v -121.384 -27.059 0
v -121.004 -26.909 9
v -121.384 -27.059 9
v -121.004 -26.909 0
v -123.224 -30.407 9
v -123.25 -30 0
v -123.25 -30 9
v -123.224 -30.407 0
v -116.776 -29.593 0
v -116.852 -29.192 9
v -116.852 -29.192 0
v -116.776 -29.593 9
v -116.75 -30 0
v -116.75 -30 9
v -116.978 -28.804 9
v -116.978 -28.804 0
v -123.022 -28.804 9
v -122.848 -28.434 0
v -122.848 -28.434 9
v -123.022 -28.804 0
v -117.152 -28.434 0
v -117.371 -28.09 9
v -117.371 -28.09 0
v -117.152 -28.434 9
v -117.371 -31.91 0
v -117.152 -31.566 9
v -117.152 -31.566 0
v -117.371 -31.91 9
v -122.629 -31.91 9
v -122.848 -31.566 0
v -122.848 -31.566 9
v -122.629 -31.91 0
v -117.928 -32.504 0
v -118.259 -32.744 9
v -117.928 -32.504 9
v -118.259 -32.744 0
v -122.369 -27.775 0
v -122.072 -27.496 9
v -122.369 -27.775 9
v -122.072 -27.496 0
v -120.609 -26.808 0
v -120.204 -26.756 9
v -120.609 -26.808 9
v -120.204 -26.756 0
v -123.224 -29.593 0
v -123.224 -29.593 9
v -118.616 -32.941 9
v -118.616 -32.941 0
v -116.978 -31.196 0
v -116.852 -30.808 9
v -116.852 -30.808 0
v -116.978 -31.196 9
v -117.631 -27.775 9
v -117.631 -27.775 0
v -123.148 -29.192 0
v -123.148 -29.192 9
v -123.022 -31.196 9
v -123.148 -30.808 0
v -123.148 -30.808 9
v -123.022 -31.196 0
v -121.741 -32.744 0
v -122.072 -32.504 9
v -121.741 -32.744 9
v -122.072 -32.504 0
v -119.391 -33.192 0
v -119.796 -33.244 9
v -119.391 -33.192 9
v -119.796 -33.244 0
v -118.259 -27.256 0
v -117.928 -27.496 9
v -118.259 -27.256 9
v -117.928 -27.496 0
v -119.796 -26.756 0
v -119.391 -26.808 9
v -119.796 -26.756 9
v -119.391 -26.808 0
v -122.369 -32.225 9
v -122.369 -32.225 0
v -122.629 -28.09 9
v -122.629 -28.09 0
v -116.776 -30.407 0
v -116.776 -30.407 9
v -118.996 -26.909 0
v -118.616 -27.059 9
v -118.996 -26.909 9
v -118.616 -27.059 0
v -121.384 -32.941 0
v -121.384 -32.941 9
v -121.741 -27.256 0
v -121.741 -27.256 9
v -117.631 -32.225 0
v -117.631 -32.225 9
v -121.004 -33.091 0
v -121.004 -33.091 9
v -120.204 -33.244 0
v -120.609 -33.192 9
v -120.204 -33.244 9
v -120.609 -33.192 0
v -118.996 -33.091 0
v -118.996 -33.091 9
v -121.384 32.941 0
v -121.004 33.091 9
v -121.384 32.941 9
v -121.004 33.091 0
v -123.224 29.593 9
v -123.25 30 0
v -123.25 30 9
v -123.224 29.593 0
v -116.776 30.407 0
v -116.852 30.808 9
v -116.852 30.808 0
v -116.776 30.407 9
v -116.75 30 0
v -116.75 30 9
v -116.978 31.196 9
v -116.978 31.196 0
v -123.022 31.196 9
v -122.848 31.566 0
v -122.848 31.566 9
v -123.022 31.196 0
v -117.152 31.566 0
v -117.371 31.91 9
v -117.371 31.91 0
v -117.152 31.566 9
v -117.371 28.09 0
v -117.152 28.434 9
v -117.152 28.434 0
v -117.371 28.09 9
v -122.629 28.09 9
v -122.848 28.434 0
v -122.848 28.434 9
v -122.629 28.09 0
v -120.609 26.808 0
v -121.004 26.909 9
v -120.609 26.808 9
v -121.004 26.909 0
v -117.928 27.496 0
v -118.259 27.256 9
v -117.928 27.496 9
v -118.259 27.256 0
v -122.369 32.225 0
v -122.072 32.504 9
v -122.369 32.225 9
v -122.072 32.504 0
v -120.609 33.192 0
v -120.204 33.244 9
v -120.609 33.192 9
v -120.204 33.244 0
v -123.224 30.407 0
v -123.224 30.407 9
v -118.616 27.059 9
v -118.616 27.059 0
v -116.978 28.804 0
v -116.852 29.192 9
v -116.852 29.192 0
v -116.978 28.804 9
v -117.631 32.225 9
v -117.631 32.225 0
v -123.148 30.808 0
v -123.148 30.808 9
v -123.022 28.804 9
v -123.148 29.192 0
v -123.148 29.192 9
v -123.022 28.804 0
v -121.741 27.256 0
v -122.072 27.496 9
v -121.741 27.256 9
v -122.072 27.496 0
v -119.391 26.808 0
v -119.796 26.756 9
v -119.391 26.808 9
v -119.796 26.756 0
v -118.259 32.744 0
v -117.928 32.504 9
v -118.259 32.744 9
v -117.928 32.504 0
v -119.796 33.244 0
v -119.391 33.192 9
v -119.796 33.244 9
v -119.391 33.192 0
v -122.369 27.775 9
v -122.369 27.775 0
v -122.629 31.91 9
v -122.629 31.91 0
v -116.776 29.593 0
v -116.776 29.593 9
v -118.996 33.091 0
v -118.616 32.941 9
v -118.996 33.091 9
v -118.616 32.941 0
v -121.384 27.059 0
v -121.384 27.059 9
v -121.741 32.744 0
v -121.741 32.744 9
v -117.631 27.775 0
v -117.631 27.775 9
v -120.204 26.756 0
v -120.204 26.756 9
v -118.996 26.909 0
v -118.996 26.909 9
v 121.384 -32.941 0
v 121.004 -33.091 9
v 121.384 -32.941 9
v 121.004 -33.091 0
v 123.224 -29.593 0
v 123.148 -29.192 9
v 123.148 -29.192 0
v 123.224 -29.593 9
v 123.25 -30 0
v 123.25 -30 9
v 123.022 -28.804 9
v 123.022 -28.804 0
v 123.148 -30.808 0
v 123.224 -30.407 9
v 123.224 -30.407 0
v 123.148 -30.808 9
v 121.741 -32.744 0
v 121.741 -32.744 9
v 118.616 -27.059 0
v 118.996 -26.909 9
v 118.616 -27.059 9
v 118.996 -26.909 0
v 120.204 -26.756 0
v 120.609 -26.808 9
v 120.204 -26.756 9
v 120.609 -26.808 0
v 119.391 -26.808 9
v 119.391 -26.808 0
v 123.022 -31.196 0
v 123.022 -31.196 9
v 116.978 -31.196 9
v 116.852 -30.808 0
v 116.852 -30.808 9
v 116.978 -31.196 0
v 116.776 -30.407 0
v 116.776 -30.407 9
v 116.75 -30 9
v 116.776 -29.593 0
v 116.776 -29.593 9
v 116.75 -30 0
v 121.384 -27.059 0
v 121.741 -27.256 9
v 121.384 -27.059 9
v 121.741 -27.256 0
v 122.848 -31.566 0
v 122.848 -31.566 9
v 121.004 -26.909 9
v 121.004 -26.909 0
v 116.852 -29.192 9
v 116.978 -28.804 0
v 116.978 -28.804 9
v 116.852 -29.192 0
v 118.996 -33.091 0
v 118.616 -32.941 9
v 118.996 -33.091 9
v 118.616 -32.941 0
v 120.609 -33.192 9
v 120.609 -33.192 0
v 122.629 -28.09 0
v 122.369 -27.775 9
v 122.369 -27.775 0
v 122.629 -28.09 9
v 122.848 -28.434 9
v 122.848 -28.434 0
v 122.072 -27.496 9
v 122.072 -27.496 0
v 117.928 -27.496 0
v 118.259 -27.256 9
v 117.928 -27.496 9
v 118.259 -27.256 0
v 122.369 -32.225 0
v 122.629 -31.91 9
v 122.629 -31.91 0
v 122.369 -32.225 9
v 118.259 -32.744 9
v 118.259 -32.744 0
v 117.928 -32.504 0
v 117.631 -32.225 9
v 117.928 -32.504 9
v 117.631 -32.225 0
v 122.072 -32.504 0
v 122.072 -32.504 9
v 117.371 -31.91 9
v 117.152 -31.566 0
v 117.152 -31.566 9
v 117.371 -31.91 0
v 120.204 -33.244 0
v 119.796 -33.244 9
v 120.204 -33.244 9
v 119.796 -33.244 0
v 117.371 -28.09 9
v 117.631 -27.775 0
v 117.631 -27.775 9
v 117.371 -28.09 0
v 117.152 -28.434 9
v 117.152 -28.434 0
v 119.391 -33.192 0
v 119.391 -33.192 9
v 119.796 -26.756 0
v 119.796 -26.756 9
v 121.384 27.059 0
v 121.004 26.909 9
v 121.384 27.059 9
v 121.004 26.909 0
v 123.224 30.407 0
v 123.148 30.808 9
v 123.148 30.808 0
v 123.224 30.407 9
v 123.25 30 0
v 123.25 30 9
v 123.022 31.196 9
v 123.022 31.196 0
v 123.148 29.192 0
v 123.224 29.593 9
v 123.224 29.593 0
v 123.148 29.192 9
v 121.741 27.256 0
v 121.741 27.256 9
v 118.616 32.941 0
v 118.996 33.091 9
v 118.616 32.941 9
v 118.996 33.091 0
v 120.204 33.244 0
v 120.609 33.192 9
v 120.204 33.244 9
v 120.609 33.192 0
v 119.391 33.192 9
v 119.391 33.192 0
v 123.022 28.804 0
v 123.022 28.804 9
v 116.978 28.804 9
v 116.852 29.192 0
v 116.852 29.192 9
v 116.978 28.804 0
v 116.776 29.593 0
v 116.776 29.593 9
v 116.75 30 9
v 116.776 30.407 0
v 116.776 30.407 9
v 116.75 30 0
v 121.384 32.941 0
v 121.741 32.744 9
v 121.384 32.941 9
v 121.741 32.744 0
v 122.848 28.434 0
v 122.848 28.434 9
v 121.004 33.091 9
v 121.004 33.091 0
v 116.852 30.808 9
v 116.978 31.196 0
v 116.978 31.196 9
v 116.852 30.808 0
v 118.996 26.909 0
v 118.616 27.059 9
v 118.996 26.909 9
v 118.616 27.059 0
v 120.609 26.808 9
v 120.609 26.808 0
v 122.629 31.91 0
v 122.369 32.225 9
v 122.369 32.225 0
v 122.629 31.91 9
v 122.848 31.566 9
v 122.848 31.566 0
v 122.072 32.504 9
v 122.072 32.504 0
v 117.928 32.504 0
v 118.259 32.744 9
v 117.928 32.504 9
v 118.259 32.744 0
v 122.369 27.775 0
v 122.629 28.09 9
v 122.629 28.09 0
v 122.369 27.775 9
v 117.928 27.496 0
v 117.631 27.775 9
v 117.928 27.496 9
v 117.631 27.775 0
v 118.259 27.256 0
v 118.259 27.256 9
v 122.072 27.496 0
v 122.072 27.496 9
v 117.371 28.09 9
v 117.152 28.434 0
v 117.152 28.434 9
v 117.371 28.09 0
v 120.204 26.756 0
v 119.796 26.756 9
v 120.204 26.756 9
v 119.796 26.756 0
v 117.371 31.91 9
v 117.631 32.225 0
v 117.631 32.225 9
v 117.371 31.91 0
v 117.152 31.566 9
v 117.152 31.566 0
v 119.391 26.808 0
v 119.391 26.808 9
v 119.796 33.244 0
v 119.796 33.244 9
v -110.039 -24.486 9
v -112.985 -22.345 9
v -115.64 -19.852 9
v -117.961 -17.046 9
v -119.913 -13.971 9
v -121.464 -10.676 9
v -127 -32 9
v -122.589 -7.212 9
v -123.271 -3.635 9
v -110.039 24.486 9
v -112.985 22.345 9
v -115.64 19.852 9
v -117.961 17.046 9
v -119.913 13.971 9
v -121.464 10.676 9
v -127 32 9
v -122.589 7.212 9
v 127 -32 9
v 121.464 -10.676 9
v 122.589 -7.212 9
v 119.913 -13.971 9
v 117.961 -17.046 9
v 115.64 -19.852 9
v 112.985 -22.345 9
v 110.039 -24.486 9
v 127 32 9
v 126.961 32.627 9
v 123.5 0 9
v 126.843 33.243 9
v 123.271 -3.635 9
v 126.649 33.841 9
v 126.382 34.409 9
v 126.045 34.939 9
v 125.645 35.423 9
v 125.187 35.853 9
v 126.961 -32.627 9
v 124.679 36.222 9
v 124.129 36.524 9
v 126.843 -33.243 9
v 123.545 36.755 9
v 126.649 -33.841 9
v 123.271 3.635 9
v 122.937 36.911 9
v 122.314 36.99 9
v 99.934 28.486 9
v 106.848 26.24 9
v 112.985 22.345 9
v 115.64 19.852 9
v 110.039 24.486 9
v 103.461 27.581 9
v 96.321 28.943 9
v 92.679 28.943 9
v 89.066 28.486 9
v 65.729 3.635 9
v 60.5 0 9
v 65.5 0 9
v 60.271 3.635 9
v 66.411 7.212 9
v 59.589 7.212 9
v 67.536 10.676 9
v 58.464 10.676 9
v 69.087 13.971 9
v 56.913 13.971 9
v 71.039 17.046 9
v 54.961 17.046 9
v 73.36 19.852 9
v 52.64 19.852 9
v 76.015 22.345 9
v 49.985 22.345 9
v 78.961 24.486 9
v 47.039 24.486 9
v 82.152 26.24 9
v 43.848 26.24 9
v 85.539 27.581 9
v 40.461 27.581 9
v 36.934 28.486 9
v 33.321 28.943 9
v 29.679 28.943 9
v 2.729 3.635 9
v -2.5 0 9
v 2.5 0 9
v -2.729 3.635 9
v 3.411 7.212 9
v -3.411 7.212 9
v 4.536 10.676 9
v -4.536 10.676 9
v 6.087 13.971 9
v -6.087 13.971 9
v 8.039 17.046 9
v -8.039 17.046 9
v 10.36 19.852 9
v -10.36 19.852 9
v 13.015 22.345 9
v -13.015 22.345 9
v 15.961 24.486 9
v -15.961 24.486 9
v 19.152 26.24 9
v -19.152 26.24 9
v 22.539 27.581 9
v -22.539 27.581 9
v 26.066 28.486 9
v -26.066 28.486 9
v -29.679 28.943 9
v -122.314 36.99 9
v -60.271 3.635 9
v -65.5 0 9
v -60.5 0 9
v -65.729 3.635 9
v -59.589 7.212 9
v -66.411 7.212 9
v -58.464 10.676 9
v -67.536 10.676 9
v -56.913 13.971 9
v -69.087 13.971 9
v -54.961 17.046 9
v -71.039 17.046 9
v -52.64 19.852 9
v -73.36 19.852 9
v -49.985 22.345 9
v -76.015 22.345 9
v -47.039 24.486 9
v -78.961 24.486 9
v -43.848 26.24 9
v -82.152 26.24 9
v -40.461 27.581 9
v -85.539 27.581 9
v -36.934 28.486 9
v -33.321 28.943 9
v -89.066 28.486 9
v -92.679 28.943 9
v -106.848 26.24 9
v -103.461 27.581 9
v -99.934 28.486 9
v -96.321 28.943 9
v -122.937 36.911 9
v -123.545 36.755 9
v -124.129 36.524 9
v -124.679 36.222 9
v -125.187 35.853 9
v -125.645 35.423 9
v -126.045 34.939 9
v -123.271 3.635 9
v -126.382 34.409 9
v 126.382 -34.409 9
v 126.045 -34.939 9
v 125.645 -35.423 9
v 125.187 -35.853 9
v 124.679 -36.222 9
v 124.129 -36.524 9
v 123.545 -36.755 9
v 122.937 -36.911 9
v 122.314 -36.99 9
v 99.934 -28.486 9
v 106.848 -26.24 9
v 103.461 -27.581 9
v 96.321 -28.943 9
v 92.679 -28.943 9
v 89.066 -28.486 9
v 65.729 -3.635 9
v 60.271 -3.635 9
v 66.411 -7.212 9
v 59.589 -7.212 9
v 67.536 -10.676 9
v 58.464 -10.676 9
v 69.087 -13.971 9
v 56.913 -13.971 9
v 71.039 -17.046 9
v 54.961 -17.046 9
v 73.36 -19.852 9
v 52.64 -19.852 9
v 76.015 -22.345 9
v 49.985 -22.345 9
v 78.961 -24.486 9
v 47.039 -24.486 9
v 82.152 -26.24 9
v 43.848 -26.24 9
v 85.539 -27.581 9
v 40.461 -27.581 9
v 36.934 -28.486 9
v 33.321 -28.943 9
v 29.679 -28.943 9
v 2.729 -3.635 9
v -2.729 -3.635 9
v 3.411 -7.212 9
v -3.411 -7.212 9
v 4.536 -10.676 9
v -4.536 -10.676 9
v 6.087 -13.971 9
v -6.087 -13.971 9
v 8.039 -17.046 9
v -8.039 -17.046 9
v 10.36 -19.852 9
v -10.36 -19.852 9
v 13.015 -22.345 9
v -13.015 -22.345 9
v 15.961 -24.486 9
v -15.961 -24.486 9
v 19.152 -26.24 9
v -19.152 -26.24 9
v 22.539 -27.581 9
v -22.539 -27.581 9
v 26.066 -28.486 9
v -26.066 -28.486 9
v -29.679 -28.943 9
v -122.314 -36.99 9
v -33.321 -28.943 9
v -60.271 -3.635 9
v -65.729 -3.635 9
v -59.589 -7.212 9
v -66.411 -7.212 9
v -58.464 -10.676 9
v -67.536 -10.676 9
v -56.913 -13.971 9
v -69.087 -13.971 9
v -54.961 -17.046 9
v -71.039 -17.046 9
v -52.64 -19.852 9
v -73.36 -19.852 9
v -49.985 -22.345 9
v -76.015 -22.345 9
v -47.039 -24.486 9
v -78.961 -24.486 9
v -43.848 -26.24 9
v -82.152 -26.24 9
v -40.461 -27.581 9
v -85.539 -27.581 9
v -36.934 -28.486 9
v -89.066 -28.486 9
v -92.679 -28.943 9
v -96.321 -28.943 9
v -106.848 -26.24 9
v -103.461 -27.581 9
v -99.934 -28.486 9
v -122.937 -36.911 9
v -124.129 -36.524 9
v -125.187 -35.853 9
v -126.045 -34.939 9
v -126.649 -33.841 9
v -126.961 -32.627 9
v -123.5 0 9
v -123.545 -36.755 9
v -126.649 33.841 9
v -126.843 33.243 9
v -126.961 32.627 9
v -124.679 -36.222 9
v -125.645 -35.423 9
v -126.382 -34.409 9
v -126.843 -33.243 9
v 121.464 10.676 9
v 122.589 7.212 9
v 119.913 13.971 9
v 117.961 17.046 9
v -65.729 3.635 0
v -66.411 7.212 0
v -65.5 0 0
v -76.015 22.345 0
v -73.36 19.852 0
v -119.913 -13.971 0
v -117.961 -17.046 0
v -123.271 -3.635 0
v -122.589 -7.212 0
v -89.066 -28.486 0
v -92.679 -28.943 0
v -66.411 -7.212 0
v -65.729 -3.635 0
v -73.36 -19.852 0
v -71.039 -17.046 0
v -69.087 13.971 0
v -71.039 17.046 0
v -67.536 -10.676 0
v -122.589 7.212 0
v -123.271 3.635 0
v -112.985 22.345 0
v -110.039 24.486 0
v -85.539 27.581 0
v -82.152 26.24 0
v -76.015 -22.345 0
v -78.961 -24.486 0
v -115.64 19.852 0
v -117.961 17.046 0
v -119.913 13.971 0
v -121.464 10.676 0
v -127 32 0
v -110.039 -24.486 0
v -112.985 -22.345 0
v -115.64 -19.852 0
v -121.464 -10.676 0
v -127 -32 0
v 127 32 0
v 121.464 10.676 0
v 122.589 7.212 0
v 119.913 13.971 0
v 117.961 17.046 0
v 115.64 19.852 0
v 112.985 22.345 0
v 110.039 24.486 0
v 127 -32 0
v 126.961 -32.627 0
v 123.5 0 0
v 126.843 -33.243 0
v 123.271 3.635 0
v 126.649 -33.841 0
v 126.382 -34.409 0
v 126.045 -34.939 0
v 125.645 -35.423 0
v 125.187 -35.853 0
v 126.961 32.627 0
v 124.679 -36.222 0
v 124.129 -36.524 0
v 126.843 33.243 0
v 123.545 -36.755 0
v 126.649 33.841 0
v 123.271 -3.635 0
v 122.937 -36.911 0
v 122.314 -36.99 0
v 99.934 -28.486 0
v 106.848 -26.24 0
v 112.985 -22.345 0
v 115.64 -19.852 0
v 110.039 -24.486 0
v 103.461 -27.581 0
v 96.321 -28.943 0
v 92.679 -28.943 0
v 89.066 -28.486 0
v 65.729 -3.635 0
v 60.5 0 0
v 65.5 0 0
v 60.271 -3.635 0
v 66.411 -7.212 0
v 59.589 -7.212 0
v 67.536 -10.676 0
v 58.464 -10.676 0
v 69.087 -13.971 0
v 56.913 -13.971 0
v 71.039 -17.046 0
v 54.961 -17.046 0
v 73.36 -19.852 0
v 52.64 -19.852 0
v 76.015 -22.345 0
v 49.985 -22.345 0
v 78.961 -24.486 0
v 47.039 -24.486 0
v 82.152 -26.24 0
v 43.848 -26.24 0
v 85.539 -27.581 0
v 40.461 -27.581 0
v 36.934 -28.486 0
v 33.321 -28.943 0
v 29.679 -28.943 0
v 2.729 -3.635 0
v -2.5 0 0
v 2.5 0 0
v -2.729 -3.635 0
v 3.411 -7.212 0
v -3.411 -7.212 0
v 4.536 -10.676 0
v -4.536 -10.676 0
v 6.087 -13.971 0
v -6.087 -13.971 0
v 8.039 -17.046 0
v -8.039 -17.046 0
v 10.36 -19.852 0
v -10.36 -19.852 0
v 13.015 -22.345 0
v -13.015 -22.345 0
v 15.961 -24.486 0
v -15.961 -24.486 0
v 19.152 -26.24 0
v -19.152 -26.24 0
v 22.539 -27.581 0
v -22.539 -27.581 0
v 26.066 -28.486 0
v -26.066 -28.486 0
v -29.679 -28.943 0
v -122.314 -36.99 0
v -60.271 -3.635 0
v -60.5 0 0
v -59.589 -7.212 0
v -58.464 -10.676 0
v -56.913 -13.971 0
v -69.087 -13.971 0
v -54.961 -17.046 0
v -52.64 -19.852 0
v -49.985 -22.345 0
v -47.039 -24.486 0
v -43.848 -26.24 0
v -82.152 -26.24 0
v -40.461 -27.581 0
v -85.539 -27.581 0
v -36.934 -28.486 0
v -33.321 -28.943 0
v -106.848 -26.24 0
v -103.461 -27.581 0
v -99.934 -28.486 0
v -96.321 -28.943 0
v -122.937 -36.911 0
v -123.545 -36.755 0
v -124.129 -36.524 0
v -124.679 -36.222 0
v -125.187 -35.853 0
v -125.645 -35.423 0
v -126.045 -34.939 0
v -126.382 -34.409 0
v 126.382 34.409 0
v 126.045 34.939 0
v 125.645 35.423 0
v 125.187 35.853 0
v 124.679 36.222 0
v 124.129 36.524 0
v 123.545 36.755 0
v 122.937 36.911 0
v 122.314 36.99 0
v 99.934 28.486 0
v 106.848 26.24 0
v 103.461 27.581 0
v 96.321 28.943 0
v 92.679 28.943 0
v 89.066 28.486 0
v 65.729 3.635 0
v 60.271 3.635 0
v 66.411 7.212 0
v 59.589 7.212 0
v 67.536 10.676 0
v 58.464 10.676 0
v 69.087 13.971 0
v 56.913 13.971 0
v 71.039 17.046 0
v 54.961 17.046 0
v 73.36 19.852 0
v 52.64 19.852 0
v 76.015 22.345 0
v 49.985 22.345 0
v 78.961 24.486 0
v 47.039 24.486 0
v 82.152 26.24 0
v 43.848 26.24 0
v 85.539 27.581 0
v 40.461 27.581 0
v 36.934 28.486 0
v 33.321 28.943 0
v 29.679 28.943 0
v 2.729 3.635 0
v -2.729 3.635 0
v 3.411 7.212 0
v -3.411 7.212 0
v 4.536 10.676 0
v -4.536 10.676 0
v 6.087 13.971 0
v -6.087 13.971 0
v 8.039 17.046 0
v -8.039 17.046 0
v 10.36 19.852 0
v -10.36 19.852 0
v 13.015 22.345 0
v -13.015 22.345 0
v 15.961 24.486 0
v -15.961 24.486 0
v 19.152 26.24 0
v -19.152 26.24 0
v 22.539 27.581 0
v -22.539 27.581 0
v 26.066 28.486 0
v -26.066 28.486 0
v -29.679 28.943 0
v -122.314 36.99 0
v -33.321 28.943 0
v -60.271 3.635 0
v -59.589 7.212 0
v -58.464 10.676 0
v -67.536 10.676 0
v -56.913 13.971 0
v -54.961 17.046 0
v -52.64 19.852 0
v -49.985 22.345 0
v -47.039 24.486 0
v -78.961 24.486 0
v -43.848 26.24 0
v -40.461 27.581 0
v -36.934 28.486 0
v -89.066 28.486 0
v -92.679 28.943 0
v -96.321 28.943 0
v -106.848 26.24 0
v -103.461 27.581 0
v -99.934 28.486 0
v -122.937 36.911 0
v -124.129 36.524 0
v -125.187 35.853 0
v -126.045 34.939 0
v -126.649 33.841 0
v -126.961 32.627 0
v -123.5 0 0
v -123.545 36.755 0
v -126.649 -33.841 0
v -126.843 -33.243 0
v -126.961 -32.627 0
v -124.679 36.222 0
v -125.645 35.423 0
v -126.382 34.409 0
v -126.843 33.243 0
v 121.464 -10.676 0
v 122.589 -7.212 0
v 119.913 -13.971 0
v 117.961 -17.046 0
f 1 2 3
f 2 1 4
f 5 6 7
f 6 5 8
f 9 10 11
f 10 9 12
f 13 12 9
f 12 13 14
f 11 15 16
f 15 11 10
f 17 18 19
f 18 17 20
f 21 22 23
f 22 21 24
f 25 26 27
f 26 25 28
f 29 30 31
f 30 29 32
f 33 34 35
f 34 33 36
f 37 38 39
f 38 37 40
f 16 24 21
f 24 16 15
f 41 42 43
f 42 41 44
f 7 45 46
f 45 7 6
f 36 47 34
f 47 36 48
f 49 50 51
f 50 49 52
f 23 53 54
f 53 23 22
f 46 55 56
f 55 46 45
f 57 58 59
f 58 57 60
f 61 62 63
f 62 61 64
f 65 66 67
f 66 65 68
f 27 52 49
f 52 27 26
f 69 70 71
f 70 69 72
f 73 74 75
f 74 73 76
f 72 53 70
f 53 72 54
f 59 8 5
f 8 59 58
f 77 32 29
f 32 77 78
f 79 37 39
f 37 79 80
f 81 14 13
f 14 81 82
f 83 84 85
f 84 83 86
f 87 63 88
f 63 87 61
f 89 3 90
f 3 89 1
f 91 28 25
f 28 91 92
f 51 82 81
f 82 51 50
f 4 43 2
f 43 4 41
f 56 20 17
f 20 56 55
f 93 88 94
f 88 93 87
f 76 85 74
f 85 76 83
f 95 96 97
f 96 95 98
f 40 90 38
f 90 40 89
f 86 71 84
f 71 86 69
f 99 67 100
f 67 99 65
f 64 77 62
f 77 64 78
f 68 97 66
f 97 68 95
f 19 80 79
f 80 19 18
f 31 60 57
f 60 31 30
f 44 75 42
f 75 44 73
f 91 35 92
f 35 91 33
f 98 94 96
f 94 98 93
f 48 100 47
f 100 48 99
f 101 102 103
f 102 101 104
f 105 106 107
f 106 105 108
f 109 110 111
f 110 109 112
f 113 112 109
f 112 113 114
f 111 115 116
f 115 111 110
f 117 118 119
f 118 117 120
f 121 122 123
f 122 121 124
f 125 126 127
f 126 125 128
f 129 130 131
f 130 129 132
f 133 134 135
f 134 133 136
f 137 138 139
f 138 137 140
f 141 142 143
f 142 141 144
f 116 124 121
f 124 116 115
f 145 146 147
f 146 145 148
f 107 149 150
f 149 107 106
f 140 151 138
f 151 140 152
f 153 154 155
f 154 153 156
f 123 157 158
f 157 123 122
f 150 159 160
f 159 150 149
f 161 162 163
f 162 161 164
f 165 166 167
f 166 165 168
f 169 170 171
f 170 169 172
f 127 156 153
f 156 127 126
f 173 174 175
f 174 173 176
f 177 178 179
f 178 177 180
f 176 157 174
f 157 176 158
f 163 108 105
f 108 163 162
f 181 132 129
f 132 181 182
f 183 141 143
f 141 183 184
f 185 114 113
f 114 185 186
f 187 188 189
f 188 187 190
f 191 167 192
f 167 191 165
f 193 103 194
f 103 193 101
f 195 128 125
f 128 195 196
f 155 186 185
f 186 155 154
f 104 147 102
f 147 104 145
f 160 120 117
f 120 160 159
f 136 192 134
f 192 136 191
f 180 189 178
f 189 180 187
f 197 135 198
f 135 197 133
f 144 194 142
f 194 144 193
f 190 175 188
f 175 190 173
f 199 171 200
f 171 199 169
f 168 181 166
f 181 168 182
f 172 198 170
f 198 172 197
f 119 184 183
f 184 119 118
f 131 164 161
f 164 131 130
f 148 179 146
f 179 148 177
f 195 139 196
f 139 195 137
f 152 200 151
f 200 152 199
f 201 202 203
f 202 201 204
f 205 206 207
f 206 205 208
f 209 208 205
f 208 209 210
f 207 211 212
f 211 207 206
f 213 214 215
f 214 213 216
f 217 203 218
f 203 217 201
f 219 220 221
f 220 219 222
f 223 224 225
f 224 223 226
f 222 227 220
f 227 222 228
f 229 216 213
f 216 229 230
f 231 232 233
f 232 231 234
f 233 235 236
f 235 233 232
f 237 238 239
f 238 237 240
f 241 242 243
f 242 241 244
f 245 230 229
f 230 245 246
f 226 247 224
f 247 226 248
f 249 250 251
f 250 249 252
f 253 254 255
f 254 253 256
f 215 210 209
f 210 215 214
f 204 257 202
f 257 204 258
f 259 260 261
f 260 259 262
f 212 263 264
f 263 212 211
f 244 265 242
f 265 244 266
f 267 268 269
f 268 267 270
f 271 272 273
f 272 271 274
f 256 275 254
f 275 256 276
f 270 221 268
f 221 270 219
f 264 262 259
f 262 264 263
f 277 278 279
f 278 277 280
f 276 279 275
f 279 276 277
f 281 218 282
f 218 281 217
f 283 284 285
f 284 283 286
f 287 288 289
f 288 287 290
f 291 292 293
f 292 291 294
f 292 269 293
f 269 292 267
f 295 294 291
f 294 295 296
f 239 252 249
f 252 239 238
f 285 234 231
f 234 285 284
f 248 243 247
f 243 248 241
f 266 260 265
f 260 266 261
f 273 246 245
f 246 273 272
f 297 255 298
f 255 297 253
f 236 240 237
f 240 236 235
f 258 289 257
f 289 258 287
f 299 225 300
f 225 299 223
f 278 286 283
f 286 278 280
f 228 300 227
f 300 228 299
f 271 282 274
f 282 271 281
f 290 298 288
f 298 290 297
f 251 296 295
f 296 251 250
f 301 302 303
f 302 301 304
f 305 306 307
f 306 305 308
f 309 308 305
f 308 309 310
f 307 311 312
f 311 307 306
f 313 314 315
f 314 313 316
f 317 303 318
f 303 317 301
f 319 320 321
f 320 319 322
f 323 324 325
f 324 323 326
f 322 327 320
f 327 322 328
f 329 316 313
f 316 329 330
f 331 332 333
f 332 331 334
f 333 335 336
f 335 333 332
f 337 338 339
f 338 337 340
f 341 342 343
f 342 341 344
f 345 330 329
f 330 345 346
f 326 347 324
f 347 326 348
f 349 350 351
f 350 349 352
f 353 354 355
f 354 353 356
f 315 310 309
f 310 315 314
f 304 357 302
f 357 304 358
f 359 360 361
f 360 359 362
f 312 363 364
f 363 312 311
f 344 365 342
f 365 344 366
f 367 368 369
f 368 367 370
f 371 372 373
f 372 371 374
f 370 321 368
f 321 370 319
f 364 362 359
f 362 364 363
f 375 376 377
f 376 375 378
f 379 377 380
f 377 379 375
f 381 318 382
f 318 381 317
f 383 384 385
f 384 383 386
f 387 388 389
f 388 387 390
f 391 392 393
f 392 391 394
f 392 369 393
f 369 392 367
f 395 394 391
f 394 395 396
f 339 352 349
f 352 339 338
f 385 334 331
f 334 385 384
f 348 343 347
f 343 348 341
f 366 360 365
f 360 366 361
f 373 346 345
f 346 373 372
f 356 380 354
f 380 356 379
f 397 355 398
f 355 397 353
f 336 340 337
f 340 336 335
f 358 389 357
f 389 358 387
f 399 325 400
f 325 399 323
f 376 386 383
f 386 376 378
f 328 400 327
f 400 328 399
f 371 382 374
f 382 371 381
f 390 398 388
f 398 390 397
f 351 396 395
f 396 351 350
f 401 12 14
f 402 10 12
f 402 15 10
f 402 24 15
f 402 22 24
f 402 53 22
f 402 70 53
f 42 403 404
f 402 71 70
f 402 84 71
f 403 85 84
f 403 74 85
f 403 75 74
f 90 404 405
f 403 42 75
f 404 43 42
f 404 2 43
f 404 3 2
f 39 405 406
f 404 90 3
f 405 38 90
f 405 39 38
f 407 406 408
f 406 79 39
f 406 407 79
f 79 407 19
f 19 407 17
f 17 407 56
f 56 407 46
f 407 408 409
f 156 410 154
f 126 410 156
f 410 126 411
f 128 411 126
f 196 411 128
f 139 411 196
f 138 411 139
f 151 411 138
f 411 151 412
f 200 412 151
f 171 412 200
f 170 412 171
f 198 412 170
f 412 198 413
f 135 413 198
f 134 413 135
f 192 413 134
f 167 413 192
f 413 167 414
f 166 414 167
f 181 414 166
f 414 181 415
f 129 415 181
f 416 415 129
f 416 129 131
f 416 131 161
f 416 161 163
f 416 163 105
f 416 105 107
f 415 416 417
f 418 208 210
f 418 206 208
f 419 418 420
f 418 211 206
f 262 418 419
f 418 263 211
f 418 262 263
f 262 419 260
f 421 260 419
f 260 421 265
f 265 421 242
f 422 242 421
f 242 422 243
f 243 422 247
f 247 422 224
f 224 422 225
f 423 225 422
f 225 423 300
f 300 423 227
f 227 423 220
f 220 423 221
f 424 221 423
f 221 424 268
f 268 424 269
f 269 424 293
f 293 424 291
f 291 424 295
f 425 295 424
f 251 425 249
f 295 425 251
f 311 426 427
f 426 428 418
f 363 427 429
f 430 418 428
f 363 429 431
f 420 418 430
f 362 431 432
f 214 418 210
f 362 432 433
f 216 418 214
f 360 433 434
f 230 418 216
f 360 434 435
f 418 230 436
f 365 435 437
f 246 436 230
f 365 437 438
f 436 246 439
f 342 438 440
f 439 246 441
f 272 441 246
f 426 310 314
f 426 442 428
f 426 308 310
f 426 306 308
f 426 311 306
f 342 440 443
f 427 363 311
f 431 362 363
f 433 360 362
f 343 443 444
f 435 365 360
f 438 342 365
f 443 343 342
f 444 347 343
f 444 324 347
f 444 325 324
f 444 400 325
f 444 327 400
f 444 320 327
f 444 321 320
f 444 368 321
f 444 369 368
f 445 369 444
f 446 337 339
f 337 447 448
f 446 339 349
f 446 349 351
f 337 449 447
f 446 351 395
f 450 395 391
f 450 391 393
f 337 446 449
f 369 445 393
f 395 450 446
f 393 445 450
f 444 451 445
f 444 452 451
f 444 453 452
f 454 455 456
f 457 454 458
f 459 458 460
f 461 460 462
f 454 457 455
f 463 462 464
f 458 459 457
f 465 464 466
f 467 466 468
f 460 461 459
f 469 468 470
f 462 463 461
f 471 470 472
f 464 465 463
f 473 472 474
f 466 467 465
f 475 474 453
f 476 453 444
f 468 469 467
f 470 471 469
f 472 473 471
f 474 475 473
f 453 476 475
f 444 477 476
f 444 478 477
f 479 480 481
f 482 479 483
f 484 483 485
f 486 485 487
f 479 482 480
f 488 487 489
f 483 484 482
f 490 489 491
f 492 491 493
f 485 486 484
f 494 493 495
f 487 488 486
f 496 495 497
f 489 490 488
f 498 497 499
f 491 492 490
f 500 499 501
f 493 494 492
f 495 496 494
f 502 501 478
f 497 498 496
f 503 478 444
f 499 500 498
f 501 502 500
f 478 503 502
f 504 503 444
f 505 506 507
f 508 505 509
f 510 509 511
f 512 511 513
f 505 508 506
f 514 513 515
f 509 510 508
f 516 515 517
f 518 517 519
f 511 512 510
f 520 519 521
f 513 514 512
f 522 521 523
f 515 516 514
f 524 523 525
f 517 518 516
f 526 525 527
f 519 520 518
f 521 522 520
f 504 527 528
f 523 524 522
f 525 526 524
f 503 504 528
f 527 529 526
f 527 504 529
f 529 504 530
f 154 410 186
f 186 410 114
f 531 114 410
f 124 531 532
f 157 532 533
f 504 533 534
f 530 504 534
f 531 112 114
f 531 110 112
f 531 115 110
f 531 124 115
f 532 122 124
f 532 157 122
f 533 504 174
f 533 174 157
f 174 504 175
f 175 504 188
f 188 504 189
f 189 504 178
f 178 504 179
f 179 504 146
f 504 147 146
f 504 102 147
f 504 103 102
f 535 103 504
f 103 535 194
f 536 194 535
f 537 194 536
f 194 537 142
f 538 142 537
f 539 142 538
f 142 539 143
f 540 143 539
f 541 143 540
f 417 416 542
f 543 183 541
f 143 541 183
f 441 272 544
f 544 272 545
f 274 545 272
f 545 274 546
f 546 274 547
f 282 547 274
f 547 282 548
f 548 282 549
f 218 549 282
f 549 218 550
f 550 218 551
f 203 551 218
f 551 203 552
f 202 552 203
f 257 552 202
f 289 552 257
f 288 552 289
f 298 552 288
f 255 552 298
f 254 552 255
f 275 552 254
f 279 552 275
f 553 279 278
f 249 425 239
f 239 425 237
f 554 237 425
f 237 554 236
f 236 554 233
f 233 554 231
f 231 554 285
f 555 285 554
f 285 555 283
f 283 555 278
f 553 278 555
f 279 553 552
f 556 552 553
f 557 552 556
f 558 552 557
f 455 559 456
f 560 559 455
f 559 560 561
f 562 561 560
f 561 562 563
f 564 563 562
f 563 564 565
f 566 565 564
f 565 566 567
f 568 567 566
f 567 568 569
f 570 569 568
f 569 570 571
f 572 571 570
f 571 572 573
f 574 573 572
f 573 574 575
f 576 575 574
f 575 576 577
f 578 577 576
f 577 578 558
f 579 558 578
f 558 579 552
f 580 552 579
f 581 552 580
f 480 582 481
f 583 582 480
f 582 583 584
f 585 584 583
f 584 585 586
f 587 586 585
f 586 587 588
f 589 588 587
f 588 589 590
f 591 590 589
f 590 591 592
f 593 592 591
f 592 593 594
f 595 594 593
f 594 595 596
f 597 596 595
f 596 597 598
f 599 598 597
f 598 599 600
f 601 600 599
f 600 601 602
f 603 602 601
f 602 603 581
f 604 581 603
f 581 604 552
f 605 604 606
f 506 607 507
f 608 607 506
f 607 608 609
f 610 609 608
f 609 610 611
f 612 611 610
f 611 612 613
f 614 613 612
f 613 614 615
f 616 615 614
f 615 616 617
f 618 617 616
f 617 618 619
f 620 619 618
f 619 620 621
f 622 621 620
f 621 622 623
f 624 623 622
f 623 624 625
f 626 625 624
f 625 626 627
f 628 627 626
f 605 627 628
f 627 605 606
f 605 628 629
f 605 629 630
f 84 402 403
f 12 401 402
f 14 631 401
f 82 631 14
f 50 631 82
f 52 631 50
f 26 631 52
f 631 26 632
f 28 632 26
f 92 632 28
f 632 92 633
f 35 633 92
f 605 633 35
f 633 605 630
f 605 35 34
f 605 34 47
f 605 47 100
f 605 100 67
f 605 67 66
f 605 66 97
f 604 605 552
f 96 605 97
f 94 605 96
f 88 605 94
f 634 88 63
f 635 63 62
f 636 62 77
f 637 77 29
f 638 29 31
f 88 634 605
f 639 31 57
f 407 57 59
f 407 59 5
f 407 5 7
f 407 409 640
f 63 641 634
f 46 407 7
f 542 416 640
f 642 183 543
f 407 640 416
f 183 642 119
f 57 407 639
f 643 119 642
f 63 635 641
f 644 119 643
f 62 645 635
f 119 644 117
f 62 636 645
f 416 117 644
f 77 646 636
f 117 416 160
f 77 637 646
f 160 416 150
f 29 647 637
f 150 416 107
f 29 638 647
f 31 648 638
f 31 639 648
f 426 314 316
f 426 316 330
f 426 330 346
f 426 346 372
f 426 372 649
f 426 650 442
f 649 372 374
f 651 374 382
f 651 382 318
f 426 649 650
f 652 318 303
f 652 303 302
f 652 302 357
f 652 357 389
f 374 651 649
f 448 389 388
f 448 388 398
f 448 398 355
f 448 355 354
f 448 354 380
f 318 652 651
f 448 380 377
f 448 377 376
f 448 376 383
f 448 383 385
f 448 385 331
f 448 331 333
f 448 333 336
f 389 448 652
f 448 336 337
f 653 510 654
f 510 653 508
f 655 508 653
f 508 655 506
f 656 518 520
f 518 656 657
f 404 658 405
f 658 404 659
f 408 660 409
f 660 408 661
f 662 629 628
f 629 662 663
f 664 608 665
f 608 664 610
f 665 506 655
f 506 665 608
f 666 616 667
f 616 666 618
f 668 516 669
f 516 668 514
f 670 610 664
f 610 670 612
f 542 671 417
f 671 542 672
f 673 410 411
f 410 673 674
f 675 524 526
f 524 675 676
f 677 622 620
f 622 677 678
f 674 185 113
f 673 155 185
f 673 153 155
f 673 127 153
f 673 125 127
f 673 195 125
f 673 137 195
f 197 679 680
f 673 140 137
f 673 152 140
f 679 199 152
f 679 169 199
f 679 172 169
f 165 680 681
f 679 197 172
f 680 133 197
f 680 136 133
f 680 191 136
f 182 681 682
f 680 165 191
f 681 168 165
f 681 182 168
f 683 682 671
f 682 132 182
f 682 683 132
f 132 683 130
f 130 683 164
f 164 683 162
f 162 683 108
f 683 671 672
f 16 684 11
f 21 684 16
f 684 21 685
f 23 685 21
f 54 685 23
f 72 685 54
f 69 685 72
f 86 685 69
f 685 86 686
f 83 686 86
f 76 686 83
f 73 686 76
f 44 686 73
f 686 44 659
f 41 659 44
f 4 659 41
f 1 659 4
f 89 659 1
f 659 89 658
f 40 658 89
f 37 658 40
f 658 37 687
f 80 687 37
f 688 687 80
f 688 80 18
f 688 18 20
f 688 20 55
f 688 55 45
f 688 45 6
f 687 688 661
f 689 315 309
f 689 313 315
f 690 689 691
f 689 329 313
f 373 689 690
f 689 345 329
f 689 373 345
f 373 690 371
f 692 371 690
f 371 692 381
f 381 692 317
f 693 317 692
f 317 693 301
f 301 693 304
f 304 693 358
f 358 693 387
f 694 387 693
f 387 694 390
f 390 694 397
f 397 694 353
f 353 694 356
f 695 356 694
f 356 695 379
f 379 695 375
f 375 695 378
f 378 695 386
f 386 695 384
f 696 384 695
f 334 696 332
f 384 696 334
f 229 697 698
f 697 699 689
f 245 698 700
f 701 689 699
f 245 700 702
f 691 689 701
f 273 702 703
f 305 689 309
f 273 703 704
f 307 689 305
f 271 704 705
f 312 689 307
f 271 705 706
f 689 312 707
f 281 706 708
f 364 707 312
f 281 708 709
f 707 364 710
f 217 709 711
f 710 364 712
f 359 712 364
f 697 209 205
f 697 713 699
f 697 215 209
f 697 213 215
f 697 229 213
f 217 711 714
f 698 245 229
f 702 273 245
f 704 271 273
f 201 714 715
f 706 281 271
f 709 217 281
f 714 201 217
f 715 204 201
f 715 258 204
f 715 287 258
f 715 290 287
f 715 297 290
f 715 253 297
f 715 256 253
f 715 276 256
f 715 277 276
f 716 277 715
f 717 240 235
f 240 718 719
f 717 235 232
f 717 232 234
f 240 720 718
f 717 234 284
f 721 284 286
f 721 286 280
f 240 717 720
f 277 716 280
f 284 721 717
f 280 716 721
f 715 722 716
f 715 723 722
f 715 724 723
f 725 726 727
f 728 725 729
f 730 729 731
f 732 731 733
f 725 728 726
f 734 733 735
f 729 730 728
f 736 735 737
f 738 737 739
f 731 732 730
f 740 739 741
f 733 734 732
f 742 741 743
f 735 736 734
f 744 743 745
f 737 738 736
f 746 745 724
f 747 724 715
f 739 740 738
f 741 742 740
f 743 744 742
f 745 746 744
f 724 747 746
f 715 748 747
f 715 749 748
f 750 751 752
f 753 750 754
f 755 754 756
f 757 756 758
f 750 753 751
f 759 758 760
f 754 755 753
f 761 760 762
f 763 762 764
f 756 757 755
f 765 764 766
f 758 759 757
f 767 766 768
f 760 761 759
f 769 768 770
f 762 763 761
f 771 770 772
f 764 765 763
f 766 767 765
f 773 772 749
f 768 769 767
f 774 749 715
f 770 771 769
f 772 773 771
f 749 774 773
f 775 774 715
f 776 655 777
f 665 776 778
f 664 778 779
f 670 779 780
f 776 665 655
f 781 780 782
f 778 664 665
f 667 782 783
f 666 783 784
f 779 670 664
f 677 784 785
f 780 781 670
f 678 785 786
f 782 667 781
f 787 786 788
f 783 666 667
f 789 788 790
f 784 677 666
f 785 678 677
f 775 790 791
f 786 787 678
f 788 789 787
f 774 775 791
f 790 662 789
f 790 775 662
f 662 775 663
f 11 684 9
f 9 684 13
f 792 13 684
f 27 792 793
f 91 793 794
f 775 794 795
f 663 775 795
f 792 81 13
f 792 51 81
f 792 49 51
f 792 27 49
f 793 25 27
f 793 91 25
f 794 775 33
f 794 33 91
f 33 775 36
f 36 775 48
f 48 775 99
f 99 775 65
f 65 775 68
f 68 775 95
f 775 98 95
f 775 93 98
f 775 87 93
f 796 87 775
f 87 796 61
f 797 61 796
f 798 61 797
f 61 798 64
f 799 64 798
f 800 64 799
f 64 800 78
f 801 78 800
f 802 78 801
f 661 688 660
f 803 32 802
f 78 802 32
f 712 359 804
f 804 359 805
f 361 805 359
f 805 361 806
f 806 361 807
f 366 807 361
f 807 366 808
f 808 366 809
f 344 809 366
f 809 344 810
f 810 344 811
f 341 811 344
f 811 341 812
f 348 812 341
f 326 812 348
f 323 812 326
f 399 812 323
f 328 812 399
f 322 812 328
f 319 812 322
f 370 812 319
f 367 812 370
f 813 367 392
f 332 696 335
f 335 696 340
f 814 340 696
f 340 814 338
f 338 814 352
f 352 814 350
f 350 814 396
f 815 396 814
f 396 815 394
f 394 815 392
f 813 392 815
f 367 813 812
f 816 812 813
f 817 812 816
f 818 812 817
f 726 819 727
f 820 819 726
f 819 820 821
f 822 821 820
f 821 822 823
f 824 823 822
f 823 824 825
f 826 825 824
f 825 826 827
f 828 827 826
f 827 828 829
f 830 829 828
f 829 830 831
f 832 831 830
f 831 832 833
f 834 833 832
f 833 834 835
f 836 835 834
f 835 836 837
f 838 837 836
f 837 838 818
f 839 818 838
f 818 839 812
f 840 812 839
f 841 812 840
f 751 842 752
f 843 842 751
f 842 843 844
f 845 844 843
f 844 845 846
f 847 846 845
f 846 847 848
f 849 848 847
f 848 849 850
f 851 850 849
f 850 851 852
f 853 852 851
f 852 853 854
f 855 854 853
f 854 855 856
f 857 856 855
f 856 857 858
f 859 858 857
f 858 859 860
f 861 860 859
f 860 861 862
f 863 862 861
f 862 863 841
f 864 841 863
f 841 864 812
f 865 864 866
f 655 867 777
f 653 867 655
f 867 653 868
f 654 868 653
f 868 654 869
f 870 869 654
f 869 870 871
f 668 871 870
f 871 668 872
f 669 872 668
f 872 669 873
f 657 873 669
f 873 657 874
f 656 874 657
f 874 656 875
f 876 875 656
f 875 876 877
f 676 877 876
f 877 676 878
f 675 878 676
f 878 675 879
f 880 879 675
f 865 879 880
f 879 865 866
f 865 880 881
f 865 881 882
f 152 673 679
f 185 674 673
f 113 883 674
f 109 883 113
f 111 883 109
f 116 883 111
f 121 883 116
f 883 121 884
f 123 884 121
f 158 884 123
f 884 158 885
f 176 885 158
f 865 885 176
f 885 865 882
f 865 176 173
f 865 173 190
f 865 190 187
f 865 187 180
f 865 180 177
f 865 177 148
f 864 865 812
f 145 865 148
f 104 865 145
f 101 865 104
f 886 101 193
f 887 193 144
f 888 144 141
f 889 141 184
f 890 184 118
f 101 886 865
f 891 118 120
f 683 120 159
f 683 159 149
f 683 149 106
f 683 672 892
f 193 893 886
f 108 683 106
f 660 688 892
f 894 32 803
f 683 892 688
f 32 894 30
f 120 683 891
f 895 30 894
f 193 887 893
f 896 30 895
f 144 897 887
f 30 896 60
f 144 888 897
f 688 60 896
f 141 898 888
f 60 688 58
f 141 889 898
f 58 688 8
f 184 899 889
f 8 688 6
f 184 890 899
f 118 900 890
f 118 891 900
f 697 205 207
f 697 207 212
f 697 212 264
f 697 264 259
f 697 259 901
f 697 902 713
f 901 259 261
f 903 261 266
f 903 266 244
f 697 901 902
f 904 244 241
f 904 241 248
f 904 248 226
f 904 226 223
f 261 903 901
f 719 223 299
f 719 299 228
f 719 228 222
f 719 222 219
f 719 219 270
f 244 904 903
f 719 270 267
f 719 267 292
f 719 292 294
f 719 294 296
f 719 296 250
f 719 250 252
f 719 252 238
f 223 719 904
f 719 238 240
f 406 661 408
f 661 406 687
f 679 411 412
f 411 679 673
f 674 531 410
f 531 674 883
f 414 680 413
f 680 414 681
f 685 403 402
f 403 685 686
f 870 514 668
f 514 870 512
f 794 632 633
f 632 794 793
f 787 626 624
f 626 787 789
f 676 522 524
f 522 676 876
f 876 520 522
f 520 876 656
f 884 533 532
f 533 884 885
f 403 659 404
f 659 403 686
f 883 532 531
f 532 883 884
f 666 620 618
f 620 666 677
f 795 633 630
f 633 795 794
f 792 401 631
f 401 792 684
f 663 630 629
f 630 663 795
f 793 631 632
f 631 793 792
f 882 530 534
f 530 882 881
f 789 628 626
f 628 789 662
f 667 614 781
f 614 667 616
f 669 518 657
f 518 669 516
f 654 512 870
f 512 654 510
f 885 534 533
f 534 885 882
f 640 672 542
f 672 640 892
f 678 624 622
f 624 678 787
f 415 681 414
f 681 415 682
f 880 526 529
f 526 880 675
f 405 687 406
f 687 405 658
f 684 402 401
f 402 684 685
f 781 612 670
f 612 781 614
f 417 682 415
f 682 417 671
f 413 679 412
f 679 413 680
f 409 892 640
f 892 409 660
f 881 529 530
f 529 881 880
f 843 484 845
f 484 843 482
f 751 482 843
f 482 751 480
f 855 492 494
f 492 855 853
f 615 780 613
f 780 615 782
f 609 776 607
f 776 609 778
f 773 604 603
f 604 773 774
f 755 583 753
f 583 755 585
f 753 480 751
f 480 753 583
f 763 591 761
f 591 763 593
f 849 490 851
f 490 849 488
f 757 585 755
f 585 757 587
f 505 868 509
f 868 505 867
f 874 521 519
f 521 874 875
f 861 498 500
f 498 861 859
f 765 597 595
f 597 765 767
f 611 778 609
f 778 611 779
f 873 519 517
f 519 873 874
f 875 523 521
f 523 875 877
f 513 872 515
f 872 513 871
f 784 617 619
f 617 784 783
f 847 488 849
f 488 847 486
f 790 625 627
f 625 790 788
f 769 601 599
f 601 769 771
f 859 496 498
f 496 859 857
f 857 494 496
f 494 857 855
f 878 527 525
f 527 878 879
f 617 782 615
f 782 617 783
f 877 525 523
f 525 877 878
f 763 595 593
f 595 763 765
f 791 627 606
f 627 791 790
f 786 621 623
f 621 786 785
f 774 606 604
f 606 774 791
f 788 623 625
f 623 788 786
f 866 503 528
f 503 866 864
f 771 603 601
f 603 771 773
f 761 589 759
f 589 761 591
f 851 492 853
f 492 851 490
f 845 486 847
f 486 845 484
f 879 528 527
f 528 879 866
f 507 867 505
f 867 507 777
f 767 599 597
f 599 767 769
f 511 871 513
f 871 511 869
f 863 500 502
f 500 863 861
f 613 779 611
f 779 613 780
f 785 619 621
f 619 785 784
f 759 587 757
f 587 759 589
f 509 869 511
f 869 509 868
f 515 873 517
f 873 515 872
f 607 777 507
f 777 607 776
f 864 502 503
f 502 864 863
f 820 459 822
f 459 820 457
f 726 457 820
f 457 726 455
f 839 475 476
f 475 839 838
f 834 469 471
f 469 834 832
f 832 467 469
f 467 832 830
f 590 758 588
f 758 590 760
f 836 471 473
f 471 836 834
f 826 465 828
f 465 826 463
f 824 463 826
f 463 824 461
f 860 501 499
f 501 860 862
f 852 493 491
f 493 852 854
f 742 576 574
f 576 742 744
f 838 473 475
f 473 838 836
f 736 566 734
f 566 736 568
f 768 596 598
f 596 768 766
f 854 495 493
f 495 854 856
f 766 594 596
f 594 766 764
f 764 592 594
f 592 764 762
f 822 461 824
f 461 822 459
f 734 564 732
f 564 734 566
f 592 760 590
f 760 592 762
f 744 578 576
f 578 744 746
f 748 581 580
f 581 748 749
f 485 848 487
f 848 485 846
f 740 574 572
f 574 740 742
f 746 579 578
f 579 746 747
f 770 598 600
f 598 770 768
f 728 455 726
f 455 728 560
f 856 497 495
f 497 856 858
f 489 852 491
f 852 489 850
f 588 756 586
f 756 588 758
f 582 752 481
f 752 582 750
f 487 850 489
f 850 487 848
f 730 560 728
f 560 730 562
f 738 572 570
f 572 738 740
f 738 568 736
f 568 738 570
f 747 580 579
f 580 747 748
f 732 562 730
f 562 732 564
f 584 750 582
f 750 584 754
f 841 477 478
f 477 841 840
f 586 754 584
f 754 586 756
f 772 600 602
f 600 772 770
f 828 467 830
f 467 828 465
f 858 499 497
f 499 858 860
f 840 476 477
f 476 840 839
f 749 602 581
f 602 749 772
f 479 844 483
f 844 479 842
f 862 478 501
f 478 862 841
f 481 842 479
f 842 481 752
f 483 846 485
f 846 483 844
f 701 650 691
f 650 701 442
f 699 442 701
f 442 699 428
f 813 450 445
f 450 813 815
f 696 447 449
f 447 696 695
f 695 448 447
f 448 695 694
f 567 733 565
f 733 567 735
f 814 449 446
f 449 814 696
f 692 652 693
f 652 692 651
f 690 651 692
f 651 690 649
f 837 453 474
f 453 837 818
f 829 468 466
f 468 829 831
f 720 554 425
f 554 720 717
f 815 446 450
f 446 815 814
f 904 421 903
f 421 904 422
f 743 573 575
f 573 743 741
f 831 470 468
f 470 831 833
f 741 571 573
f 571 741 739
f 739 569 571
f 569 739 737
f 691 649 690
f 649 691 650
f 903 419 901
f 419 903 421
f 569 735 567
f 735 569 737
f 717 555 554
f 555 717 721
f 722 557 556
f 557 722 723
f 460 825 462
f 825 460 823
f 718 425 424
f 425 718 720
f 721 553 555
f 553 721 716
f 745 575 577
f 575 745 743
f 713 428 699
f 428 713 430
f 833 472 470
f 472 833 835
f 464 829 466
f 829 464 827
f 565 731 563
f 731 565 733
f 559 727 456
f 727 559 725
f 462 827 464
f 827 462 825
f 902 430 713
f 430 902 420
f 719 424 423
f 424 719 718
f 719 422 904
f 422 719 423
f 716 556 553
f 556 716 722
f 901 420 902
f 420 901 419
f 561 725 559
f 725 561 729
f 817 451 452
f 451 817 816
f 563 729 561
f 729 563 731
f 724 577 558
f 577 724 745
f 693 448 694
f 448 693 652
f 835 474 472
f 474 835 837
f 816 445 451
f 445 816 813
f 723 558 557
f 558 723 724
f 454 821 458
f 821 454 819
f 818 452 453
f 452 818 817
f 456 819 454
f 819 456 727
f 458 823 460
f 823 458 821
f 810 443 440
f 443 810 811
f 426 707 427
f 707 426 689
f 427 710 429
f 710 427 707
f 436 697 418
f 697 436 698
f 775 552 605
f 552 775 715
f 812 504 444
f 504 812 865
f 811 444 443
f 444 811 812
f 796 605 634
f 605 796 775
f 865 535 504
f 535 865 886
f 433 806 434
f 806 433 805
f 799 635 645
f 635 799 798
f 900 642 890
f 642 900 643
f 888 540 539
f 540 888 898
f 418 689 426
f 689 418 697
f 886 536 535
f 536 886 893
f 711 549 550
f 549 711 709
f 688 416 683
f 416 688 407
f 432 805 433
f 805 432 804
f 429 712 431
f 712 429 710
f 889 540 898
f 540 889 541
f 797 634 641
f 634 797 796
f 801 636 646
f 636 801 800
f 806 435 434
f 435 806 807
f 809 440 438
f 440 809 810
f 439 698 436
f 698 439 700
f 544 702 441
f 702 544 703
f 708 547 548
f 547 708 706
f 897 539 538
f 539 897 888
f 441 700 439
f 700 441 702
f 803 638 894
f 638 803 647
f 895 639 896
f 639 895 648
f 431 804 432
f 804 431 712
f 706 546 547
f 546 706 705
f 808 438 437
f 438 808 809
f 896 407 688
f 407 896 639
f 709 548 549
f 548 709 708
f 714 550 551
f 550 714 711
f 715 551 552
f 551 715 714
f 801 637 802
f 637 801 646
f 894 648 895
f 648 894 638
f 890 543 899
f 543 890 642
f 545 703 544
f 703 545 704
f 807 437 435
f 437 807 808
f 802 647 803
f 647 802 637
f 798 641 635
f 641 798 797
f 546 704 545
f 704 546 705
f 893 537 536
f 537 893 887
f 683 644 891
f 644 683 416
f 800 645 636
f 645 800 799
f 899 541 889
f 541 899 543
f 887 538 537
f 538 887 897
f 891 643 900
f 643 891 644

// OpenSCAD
$fn = 50;


difference() {
	union() {
		hull() {
			translate(v = [-122.0000000000, 32.0000000000, 0]) {
				cylinder(h = 9, r = 5);
			}
			translate(v = [122.0000000000, 32.0000000000, 0]) {
				cylinder(h = 9, r = 5);
			}
			translate(v = [-122.0000000000, -32.0000000000, 0]) {
				cylinder(h = 9, r = 5);
			}
			translate(v = [122.0000000000, -32.0000000000, 0]) {
				cylinder(h = 9, r = 5);
			}
		}
	}
	union() {
		#translate(v = [-120.0000000000, -30.0000000000, -100.0000000000]) {
			cylinder(h = 200, r = 3.2500000000);
		}
		#translate(v = [-120.0000000000, 30.0000000000, -100.0000000000]) {
			cylinder(h = 200, r = 3.2500000000);
		}
		#translate(v = [120.0000000000, -30.0000000000, -100.0000000000]) {
			cylinder(h = 200, r = 3.2500000000);
		}
		#translate(v = [120.0000000000, 30.0000000000, -100.0000000000]) {
			cylinder(h = 200, r = 3.2500000000);
		}
		#translate(v = [-94.5000000000, 0, 0]) {
			cylinder(h = 9, r = 29.0000000000);
		}
		#translate(v = [-31.5000000000, 0, 0]) {
			cylinder(h = 9, r = 29.0000000000);
		}
		#translate(v = [31.5000000000, 0, 0]) {
			cylinder(h = 9, r = 29.0000000000);
		}
		#translate(v = [94.5000000000, 0, 0]) {
			cylinder(h = 9, r = 29.0000000000);
		}
	}
}
